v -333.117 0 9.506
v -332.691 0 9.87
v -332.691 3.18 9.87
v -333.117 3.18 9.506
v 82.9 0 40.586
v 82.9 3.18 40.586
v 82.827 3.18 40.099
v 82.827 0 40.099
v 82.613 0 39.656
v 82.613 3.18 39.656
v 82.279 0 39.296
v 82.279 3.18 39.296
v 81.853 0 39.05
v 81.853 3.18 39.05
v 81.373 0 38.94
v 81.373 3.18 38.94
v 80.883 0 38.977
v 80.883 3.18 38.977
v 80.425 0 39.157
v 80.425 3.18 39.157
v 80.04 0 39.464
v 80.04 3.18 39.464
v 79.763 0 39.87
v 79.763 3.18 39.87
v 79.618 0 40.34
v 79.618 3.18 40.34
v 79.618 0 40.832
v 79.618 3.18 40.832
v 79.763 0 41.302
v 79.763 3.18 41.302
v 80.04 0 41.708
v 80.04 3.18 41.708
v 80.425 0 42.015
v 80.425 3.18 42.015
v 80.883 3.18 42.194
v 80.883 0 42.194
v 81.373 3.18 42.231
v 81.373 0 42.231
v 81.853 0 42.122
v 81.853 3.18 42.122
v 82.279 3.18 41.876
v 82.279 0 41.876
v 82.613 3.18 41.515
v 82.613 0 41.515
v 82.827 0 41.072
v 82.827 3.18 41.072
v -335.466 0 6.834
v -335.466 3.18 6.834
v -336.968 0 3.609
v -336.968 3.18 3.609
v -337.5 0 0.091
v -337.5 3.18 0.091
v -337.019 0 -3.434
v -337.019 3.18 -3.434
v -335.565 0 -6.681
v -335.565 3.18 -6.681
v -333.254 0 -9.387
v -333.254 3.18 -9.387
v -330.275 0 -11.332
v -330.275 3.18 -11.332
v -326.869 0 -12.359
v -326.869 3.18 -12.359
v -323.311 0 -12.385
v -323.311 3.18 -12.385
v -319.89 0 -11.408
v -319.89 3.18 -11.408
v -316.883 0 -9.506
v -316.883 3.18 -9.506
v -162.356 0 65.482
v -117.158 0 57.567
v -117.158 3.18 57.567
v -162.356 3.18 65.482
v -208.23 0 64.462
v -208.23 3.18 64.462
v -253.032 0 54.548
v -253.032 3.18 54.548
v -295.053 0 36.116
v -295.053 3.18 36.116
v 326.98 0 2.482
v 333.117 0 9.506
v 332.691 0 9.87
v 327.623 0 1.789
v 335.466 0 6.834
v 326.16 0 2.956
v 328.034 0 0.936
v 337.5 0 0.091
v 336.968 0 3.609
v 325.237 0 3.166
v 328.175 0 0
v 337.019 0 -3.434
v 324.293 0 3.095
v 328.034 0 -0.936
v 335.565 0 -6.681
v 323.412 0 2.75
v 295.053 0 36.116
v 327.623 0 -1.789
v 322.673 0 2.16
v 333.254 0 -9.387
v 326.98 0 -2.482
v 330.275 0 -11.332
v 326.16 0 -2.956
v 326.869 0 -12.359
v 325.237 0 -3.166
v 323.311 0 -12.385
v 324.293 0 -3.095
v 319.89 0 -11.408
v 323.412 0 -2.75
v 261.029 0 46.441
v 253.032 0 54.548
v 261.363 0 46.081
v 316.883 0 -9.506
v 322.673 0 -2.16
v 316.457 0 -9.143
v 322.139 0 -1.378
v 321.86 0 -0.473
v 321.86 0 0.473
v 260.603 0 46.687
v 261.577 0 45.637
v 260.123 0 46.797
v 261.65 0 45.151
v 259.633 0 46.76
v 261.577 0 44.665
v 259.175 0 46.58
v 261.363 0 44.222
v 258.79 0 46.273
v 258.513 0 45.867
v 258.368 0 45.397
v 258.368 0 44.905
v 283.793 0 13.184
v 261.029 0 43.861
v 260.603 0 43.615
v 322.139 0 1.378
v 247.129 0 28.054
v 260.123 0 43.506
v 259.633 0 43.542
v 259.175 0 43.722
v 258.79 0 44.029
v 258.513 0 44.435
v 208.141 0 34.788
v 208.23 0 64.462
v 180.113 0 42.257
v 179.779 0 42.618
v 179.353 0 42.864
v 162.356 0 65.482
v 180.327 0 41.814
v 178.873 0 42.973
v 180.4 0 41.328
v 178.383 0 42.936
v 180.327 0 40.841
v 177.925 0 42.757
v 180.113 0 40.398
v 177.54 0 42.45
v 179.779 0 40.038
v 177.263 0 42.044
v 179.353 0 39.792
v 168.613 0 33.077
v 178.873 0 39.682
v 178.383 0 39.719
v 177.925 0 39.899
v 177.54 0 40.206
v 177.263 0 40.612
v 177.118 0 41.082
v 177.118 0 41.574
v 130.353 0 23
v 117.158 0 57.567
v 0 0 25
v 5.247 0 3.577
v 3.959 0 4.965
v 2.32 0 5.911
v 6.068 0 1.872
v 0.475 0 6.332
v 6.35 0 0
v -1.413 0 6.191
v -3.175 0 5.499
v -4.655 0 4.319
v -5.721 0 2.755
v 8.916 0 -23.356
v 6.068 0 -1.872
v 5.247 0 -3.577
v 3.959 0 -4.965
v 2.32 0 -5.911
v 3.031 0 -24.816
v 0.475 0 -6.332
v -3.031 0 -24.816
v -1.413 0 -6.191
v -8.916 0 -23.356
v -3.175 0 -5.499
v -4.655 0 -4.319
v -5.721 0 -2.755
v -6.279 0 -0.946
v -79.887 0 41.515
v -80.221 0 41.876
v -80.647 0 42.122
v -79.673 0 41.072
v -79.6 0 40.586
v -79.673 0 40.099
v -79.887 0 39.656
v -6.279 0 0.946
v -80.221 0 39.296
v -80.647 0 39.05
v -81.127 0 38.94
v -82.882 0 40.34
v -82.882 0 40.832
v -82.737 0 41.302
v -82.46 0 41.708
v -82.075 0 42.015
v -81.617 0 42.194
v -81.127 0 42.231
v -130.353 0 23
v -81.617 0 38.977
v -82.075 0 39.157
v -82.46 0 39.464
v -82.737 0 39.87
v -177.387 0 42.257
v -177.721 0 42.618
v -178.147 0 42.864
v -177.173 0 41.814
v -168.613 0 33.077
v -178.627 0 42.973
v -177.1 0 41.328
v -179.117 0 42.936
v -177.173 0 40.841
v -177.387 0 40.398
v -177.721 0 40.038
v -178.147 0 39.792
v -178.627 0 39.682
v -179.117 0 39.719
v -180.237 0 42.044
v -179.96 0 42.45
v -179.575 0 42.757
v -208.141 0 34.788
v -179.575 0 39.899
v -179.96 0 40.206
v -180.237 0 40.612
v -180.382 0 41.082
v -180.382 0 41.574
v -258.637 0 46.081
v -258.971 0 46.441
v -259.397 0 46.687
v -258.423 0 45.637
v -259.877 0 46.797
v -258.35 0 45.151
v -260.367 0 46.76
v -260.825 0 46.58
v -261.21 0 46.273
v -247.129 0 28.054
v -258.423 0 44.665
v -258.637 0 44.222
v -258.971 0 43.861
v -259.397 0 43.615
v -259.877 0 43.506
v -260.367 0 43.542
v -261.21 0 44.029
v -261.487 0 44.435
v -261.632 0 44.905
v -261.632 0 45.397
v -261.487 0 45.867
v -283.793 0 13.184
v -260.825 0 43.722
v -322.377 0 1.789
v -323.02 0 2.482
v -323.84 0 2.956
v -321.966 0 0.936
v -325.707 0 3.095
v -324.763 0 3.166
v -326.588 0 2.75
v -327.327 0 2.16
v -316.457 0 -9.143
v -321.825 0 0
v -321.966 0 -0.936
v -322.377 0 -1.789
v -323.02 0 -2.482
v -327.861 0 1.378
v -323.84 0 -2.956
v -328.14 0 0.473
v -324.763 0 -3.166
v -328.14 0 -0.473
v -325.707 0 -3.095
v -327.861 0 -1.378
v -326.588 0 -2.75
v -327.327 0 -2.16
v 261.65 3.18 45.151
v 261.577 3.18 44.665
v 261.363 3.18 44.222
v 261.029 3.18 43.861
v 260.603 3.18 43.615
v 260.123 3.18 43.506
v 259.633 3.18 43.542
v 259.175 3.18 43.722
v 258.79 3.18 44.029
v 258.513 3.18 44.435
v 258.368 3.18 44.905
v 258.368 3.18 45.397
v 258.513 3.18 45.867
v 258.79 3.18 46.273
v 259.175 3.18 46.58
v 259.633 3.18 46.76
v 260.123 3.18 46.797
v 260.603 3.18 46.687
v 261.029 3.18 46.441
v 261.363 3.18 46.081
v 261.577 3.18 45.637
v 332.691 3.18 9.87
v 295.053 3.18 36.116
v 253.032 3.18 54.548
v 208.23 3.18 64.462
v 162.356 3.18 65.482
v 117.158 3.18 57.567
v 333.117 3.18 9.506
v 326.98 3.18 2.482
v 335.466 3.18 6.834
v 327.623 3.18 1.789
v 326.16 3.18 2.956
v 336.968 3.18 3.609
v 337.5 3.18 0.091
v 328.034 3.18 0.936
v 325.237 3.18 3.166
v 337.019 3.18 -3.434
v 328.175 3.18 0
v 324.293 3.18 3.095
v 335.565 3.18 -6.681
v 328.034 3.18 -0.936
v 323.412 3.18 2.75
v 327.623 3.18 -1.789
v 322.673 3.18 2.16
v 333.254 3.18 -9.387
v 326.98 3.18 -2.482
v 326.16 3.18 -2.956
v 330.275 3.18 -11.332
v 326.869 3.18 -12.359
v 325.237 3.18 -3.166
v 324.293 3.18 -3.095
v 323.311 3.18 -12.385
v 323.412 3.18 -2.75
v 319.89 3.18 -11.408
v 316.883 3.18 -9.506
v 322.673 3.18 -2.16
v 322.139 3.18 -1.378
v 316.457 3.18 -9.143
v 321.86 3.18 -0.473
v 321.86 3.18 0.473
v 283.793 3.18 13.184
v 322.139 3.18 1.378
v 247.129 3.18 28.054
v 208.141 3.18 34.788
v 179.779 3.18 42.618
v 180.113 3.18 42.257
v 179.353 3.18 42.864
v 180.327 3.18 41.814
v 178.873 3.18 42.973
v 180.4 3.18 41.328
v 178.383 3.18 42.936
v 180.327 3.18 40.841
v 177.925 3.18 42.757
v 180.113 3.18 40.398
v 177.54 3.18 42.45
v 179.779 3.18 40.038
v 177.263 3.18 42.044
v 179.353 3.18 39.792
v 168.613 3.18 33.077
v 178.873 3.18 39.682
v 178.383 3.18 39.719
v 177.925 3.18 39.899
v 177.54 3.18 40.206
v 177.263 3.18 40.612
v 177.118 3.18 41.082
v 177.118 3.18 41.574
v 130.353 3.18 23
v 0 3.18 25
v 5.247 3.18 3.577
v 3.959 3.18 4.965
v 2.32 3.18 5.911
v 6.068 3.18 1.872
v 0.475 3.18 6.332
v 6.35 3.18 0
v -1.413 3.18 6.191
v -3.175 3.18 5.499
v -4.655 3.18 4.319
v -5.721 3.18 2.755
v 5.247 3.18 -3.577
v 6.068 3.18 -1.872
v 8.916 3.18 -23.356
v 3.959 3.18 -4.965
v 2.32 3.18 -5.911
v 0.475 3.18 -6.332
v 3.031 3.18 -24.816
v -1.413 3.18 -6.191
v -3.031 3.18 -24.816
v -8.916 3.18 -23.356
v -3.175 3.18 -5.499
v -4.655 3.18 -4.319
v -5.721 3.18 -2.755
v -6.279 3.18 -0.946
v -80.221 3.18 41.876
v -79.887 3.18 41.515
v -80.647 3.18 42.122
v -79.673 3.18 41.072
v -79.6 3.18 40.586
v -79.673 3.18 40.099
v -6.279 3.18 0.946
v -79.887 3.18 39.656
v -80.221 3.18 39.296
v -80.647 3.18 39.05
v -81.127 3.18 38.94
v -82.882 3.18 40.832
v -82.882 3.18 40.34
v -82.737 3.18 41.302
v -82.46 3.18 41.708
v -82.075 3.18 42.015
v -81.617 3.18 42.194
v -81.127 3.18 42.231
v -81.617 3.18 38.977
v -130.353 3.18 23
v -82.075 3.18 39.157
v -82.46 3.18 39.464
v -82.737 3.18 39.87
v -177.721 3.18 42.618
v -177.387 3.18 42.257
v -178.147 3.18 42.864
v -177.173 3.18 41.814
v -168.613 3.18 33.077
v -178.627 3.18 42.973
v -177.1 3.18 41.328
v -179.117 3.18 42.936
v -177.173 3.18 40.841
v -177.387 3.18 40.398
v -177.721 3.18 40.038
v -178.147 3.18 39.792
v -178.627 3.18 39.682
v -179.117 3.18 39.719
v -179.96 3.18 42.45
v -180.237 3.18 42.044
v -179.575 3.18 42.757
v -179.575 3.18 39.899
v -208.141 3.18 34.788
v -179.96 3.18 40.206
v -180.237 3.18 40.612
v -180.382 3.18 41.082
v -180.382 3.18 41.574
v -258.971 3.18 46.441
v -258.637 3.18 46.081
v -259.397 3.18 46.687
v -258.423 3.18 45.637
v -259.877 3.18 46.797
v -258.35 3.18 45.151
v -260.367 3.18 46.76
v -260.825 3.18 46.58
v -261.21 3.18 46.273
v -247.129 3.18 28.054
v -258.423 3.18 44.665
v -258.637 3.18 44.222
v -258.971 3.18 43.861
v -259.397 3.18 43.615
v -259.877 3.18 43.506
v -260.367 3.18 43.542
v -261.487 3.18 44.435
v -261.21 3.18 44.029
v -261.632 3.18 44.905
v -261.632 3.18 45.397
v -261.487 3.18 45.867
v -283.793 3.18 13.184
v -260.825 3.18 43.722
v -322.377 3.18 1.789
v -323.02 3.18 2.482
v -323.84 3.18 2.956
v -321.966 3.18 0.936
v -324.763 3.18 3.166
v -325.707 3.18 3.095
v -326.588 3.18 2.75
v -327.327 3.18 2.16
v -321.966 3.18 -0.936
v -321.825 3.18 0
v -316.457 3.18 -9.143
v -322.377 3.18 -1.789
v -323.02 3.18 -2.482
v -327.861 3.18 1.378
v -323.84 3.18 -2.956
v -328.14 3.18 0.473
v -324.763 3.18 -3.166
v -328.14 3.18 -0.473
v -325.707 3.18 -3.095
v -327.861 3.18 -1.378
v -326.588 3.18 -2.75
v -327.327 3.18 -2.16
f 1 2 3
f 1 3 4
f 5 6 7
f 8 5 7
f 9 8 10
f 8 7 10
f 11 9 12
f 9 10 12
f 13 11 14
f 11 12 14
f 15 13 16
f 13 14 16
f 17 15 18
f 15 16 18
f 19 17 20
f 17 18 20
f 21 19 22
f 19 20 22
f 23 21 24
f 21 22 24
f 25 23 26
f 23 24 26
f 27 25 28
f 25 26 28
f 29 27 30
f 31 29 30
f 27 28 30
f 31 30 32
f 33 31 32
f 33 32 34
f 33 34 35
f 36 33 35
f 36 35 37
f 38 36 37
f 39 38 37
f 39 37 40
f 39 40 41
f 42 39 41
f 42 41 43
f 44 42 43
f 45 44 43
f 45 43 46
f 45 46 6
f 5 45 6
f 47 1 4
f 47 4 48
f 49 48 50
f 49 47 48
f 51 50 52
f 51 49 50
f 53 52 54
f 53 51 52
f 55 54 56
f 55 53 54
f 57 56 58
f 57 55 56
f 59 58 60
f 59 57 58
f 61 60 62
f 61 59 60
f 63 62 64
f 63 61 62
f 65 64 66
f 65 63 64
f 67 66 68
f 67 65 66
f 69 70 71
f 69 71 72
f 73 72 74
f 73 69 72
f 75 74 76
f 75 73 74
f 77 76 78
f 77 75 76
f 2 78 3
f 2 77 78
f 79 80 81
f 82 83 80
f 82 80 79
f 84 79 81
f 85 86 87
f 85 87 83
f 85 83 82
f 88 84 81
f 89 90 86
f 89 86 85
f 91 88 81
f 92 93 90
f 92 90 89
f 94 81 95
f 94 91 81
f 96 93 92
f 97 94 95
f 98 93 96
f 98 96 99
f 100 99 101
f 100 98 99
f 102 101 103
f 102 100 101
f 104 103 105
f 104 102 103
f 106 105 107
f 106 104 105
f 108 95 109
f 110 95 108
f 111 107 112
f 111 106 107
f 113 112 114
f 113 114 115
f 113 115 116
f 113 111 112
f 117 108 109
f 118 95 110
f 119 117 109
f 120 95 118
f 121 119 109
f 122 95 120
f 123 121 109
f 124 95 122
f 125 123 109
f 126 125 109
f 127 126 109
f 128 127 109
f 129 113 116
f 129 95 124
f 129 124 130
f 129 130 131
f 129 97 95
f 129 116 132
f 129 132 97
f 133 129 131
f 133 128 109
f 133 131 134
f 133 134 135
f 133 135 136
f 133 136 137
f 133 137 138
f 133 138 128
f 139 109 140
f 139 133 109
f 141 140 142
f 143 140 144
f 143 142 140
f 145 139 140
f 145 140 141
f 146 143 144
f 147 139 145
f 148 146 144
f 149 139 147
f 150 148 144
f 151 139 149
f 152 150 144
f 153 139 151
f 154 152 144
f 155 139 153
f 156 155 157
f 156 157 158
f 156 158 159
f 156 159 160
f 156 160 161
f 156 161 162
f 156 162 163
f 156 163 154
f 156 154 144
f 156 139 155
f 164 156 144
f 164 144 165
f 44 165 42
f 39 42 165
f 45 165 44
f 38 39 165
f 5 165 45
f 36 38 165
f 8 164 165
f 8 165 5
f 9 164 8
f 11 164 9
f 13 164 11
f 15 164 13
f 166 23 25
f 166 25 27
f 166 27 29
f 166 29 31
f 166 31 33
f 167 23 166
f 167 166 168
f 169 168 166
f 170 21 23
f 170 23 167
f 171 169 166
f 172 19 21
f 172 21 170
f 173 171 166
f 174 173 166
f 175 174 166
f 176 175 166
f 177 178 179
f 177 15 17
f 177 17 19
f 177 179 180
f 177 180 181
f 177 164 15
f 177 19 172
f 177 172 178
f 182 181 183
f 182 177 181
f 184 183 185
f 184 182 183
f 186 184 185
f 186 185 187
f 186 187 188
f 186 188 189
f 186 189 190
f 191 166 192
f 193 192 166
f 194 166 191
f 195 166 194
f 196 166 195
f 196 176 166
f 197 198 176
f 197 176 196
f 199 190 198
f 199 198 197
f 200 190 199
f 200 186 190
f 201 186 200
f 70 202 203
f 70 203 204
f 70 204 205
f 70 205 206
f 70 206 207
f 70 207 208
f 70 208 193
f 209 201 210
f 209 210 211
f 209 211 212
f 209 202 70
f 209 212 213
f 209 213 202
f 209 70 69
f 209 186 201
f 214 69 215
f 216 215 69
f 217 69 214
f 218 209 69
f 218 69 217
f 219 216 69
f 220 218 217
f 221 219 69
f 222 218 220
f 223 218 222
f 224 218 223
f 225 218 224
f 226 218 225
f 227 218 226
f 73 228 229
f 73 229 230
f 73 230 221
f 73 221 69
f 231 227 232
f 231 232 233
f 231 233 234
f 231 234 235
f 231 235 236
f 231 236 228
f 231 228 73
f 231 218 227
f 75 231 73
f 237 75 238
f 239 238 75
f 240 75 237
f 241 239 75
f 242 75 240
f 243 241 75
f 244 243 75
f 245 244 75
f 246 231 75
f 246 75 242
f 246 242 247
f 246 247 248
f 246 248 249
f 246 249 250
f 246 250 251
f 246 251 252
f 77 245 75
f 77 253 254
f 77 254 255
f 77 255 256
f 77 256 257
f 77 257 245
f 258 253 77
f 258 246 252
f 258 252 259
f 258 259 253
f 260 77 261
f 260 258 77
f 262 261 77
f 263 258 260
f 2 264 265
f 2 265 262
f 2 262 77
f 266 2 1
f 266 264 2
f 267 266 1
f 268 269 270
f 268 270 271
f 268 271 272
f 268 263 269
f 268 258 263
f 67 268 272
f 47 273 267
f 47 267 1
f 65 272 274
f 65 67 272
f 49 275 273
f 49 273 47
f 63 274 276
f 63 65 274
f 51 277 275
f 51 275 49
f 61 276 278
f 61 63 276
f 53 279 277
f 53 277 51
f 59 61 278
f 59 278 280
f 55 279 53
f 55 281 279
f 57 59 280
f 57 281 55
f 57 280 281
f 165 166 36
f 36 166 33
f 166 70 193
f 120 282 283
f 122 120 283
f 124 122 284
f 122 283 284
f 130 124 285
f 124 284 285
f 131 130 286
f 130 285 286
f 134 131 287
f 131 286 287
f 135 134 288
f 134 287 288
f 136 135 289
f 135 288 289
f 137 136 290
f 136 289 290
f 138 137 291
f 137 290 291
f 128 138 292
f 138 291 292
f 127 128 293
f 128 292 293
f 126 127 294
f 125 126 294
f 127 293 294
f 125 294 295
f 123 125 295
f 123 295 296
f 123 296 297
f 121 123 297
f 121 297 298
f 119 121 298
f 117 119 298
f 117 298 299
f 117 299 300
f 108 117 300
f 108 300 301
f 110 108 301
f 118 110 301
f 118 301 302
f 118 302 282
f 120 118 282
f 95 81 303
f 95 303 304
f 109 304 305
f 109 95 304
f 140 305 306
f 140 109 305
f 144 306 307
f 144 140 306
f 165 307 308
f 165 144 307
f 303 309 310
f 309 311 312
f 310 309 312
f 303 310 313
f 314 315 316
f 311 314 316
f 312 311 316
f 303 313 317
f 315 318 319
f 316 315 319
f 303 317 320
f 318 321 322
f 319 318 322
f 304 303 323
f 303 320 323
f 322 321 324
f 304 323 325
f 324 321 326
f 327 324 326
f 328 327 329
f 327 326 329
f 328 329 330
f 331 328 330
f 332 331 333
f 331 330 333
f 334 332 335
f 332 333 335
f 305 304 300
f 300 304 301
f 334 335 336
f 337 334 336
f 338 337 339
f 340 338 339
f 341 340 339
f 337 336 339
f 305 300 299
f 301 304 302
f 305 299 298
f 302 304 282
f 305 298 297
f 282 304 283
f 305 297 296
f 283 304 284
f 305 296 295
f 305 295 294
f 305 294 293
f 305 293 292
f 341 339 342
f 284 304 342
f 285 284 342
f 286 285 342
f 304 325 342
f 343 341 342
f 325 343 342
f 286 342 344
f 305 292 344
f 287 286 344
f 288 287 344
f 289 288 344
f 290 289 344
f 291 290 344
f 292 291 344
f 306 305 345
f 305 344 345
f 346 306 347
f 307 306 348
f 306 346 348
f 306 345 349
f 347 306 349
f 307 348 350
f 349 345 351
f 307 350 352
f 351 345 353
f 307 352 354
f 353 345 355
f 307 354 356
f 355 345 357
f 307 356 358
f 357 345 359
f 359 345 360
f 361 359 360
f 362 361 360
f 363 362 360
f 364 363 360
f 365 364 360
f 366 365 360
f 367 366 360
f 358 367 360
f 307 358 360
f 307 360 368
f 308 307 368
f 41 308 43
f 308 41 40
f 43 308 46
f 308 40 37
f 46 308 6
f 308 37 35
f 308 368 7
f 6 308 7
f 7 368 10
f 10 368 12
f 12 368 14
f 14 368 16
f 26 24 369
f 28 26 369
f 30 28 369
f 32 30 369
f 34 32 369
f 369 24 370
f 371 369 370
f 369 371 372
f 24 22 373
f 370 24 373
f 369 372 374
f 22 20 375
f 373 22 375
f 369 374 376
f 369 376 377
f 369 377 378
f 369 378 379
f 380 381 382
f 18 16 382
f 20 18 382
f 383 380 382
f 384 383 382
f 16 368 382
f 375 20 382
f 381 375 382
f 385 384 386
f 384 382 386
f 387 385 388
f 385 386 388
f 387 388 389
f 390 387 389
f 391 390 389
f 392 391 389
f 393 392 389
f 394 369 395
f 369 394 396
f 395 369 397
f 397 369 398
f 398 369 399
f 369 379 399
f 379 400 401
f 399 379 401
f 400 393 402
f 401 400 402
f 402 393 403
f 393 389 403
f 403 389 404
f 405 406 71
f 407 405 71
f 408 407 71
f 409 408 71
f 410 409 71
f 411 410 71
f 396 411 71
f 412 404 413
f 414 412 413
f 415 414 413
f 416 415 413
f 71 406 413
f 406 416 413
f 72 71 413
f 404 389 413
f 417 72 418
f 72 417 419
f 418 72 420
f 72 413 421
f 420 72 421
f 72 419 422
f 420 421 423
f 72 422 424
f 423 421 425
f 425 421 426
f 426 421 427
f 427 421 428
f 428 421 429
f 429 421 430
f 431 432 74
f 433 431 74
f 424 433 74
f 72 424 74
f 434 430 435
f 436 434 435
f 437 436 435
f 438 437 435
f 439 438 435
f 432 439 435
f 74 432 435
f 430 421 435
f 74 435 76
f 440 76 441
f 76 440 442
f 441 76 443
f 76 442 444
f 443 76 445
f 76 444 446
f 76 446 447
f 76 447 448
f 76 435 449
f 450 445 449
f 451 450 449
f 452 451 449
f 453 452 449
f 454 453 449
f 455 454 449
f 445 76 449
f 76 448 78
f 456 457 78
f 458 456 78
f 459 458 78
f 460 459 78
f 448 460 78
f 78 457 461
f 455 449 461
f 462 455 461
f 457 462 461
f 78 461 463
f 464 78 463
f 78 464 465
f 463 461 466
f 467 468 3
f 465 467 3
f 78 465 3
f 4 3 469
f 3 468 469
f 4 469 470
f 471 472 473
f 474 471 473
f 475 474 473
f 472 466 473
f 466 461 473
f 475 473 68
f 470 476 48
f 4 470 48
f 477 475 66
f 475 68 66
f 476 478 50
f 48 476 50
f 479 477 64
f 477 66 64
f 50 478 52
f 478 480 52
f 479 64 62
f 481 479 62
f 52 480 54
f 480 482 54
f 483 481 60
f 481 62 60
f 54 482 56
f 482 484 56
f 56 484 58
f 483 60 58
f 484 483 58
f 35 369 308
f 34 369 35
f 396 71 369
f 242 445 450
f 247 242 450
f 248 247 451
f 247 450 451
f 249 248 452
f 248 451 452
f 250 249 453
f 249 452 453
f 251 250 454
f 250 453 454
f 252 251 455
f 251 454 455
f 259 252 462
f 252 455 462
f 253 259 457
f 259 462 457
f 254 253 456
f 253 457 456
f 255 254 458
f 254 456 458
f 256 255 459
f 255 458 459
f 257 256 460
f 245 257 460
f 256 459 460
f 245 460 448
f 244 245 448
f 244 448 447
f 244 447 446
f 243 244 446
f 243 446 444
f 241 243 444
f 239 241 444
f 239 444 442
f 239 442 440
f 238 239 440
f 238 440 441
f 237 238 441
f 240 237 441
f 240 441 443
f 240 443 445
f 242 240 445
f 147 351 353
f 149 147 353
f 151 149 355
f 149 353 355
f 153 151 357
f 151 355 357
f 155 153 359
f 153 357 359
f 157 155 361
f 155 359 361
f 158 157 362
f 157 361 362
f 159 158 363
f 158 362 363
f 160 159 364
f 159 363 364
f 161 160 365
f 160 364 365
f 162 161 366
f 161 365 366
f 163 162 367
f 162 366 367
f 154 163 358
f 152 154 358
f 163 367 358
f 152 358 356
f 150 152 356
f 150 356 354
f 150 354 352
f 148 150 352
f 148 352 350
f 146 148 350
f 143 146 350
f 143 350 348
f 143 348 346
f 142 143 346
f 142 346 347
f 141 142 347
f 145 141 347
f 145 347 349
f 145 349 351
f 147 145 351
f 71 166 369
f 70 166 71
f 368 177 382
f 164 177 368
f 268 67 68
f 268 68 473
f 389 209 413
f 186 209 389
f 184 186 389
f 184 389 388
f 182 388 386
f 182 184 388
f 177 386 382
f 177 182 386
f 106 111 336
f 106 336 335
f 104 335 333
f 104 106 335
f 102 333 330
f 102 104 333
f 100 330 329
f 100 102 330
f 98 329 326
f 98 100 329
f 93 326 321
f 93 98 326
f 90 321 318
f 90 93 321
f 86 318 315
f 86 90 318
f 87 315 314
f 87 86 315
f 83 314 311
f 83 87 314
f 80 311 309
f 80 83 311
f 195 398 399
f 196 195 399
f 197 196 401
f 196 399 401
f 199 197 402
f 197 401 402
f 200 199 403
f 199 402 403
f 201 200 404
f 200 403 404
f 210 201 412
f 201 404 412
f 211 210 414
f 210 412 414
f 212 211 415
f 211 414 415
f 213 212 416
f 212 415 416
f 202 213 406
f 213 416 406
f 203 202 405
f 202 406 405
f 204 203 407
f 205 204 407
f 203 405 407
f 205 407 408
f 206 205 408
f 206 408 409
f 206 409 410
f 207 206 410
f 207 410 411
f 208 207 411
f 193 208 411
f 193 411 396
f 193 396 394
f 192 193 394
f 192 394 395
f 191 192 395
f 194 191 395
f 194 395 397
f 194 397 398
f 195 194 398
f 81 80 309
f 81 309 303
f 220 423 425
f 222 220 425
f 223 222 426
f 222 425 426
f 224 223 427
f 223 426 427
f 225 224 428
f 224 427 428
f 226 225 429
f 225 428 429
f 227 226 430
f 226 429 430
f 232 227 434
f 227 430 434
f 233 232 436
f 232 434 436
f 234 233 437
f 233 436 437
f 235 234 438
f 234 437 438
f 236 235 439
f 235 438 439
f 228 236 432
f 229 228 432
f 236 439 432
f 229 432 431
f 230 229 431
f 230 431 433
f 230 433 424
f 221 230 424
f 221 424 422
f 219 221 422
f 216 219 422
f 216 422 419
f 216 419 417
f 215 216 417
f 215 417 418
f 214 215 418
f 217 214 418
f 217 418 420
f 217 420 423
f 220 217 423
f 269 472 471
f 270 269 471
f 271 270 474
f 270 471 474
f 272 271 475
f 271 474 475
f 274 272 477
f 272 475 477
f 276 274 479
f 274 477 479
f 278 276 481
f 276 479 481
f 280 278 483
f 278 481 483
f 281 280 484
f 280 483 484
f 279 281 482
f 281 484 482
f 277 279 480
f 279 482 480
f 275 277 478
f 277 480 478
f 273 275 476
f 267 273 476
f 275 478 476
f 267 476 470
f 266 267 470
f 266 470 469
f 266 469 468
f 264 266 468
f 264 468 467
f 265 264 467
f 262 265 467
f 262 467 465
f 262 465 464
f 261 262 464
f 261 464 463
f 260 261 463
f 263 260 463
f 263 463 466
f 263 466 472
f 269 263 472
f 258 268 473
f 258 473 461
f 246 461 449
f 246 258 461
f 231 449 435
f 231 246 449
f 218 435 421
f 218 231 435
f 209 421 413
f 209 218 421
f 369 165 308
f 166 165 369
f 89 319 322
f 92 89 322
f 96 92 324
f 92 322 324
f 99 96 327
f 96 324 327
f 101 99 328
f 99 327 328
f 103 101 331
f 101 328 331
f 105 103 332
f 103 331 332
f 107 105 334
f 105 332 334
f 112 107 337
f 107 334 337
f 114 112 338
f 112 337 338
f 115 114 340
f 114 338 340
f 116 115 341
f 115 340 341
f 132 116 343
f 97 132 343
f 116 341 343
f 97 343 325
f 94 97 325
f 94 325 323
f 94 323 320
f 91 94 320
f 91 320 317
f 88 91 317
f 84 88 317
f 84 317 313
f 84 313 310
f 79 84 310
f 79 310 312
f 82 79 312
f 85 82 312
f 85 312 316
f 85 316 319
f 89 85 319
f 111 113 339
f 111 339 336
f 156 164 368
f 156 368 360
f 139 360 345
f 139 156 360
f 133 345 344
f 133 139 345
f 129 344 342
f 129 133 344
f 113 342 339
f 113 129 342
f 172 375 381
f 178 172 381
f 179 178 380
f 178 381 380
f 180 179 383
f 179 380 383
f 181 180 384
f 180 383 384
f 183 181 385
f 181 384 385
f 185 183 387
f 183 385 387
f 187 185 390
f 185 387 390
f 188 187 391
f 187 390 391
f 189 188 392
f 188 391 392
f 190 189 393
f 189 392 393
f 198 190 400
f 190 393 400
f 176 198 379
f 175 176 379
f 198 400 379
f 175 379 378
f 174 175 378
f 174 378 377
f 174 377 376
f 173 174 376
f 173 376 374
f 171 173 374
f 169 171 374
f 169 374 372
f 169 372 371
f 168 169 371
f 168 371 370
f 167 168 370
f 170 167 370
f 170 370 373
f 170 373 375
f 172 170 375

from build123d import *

# Parameters (mm, degrees)
BOSS_EXTRUDE1_DEPTH = 3.18
SKETCH3_R           = 3.175
SKETCH3_R_2         = 6.35
SKETCH3_R_3         = 1.65
CUT_EXTRUDE1_DEPTH  = 4.18


with BuildPart() as part:
    # Sketch1 → Boss-Extrude1 (new body)
    with BuildSketch(Plane(origin=(0, 0, 0), x_dir=(1, 0, 0), z_dir=(0, 1, 0))):
        with BuildLine():
            Line((-316.883271773, 9.506246519), (-316.457354569, 9.142585196))
            ThreePointArc((-316.457354569, 9.142585196), (-227.815789201, -32.465901654), (-130.352994696, -23.000333716))
            Line((-130.352994696, -23.000333716), (-8.915781366, 23.356130729))
            ThreePointArc((-8.915781366, 23.356130729), (0, 25), (8.915781366, 23.356130729))
            Line((8.915781366, 23.356130729), (130.352994696, -23.000333716))
            ThreePointArc((130.352994696, -23.000333716), (227.815789201, -32.465901654), (316.457354569, 9.142585196))
            Line((316.457354569, 9.142585196), (316.883271773, 9.506246519))
            ThreePointArc((316.883271773, 9.506246519), (334.506246519, 8.116728227), (333.116728227, -9.506246519))
            Line((333.116728227, -9.506246519), (332.690811024, -9.869907842))
            ThreePointArc((332.690811024, -9.869907842), (230.873321689, -60.601151934), (117.157638275, -57.567407196))
            Line((117.157638275, -57.567407196), (0, -25))
            Line((0, -25), (-117.157638275, -57.567407196))
            ThreePointArc((-117.157638275, -57.567407196), (-230.873321689, -60.601151934), (-332.690811024, -9.869907842))
            Line((-332.690811024, -9.869907842), (-333.116728227, -9.506246519))
            ThreePointArc((-333.116728227, -9.506246519), (-334.506246519, 8.116728227), (-316.883271773, 9.506246519))
        make_face()
    extrude(amount=BOSS_EXTRUDE1_DEPTH)

    # Sketch3 → Cut-Extrude1 (cut, through all)
    with BuildSketch(Plane(origin=(0, 3.18, 0), x_dir=(1, 0, 0), z_dir=(0, 1, 0))):
        with Locations((-325, 0)):
            Circle(SKETCH3_R)
        Circle(SKETCH3_R_2)
        with Locations((-260, -45.151120288)):
            Circle(SKETCH3_R_3)
        with Locations((-178.75, -41.327805807)):
            Circle(SKETCH3_R_3)
        with Locations((-81.25, -40.58582431)):
            Circle(SKETCH3_R_3)
        with Locations((81.25, -40.58582431)):
            Circle(SKETCH3_R_3)
        with Locations((178.75, -41.327805807)):
            Circle(SKETCH3_R_3)
        with Locations((260, -45.151120288)):
            Circle(SKETCH3_R_3)
        with Locations((325, 0)):
            Circle(SKETCH3_R)
    extrude(amount=-CUT_EXTRUDE1_DEPTH, mode=Mode.SUBTRACT)


solid = part.part
